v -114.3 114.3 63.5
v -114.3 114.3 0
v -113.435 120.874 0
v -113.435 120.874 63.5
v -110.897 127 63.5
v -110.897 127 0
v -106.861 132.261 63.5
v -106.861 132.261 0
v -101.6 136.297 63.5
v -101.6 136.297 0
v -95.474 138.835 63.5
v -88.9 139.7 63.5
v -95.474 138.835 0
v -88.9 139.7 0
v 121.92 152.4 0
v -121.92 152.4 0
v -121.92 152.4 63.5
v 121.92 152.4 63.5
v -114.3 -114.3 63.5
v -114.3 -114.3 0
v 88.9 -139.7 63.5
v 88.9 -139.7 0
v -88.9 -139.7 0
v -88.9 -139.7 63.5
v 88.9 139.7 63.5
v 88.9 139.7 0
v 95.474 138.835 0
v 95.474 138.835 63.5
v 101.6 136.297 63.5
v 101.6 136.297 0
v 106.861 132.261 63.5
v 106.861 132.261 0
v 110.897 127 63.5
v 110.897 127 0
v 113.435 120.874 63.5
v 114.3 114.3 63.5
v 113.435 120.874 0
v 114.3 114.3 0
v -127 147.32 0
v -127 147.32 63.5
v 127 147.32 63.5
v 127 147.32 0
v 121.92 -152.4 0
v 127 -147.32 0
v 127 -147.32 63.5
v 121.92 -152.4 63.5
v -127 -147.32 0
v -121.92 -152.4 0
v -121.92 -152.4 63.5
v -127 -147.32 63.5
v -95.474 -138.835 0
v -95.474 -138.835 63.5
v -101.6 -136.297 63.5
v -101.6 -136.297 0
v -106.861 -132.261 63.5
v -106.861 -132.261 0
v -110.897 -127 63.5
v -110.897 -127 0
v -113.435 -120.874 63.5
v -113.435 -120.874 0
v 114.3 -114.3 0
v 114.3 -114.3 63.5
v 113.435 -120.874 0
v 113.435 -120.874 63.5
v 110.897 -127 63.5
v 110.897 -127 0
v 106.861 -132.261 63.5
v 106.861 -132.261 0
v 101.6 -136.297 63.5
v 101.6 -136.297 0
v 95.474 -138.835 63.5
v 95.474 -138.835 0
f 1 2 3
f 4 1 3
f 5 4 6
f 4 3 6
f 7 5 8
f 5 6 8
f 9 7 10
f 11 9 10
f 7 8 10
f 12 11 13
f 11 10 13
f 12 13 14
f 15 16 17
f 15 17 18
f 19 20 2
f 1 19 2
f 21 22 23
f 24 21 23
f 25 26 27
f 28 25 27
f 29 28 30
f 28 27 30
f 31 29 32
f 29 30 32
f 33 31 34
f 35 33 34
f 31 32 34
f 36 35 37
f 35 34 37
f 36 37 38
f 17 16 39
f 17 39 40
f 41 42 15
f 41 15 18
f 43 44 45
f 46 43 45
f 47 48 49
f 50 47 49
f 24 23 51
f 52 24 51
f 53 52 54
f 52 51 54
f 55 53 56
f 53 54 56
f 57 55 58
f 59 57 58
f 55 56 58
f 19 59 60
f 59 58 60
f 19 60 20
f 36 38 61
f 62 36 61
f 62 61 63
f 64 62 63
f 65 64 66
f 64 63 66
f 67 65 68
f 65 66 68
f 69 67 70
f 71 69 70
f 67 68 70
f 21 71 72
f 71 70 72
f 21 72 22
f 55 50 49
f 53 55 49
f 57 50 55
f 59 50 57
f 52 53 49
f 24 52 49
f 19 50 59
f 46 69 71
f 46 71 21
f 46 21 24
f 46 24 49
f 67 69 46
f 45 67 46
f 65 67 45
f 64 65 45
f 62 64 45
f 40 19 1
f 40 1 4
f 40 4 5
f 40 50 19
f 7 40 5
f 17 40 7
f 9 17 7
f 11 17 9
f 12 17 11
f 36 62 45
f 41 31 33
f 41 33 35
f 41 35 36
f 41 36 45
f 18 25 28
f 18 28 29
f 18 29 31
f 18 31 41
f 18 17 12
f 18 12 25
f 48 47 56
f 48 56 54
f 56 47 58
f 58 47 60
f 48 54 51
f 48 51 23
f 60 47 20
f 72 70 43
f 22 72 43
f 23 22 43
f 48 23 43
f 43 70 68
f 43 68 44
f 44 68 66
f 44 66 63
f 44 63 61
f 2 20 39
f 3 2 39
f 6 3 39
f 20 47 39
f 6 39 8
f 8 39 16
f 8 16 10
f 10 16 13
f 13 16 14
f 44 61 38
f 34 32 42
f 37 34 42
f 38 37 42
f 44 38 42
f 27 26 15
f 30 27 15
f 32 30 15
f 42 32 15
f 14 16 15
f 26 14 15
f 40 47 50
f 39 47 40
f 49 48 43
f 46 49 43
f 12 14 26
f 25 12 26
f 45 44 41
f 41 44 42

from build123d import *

# Parameters (mm, degrees)
F0_W     = 254
F0_H     = 304.8
F1_DEPTH = 63.5
F2_SIZE  = 5.08


with BuildPart() as f1:
    # F0 (on Top) → F1 (new body)
    with BuildSketch(Plane.XY):
        Rectangle(F0_W, F0_H)
        with BuildLine():
            ThreePointArc((-114.3, 114.3), (-106.860512, 132.260512), (-88.9, 139.7))
            Line((-88.9, 139.7), (88.9, 139.7))
            ThreePointArc((88.9, 139.7), (106.860512, 132.260512), (114.3, 114.3))
            Line((114.3, 114.3), (114.3, -114.3))
            ThreePointArc((114.3, -114.3), (106.860512, -132.260512), (88.9, -139.7))
            Line((88.9, -139.7), (-88.9, -139.7))
            ThreePointArc((-88.9, -139.7), (-106.860512, -132.260512), (-114.3, -114.3))
            Line((-114.3, -114.3), (-114.3, 114.3))
        make_face(mode=Mode.SUBTRACT)
    extrude(amount=F1_DEPTH)

    # F2
    f2_edges = [f1.edges().sort_by_distance(p)[0] for p in [
        (-127, 152.4, 31.75),
        (127, 152.4, 31.75),
        (127, -152.4, 31.75),
        (-127, -152.4, 31.75),
    ]]
    chamfer(f2_edges, length=F2_SIZE)


solid = f1.part
